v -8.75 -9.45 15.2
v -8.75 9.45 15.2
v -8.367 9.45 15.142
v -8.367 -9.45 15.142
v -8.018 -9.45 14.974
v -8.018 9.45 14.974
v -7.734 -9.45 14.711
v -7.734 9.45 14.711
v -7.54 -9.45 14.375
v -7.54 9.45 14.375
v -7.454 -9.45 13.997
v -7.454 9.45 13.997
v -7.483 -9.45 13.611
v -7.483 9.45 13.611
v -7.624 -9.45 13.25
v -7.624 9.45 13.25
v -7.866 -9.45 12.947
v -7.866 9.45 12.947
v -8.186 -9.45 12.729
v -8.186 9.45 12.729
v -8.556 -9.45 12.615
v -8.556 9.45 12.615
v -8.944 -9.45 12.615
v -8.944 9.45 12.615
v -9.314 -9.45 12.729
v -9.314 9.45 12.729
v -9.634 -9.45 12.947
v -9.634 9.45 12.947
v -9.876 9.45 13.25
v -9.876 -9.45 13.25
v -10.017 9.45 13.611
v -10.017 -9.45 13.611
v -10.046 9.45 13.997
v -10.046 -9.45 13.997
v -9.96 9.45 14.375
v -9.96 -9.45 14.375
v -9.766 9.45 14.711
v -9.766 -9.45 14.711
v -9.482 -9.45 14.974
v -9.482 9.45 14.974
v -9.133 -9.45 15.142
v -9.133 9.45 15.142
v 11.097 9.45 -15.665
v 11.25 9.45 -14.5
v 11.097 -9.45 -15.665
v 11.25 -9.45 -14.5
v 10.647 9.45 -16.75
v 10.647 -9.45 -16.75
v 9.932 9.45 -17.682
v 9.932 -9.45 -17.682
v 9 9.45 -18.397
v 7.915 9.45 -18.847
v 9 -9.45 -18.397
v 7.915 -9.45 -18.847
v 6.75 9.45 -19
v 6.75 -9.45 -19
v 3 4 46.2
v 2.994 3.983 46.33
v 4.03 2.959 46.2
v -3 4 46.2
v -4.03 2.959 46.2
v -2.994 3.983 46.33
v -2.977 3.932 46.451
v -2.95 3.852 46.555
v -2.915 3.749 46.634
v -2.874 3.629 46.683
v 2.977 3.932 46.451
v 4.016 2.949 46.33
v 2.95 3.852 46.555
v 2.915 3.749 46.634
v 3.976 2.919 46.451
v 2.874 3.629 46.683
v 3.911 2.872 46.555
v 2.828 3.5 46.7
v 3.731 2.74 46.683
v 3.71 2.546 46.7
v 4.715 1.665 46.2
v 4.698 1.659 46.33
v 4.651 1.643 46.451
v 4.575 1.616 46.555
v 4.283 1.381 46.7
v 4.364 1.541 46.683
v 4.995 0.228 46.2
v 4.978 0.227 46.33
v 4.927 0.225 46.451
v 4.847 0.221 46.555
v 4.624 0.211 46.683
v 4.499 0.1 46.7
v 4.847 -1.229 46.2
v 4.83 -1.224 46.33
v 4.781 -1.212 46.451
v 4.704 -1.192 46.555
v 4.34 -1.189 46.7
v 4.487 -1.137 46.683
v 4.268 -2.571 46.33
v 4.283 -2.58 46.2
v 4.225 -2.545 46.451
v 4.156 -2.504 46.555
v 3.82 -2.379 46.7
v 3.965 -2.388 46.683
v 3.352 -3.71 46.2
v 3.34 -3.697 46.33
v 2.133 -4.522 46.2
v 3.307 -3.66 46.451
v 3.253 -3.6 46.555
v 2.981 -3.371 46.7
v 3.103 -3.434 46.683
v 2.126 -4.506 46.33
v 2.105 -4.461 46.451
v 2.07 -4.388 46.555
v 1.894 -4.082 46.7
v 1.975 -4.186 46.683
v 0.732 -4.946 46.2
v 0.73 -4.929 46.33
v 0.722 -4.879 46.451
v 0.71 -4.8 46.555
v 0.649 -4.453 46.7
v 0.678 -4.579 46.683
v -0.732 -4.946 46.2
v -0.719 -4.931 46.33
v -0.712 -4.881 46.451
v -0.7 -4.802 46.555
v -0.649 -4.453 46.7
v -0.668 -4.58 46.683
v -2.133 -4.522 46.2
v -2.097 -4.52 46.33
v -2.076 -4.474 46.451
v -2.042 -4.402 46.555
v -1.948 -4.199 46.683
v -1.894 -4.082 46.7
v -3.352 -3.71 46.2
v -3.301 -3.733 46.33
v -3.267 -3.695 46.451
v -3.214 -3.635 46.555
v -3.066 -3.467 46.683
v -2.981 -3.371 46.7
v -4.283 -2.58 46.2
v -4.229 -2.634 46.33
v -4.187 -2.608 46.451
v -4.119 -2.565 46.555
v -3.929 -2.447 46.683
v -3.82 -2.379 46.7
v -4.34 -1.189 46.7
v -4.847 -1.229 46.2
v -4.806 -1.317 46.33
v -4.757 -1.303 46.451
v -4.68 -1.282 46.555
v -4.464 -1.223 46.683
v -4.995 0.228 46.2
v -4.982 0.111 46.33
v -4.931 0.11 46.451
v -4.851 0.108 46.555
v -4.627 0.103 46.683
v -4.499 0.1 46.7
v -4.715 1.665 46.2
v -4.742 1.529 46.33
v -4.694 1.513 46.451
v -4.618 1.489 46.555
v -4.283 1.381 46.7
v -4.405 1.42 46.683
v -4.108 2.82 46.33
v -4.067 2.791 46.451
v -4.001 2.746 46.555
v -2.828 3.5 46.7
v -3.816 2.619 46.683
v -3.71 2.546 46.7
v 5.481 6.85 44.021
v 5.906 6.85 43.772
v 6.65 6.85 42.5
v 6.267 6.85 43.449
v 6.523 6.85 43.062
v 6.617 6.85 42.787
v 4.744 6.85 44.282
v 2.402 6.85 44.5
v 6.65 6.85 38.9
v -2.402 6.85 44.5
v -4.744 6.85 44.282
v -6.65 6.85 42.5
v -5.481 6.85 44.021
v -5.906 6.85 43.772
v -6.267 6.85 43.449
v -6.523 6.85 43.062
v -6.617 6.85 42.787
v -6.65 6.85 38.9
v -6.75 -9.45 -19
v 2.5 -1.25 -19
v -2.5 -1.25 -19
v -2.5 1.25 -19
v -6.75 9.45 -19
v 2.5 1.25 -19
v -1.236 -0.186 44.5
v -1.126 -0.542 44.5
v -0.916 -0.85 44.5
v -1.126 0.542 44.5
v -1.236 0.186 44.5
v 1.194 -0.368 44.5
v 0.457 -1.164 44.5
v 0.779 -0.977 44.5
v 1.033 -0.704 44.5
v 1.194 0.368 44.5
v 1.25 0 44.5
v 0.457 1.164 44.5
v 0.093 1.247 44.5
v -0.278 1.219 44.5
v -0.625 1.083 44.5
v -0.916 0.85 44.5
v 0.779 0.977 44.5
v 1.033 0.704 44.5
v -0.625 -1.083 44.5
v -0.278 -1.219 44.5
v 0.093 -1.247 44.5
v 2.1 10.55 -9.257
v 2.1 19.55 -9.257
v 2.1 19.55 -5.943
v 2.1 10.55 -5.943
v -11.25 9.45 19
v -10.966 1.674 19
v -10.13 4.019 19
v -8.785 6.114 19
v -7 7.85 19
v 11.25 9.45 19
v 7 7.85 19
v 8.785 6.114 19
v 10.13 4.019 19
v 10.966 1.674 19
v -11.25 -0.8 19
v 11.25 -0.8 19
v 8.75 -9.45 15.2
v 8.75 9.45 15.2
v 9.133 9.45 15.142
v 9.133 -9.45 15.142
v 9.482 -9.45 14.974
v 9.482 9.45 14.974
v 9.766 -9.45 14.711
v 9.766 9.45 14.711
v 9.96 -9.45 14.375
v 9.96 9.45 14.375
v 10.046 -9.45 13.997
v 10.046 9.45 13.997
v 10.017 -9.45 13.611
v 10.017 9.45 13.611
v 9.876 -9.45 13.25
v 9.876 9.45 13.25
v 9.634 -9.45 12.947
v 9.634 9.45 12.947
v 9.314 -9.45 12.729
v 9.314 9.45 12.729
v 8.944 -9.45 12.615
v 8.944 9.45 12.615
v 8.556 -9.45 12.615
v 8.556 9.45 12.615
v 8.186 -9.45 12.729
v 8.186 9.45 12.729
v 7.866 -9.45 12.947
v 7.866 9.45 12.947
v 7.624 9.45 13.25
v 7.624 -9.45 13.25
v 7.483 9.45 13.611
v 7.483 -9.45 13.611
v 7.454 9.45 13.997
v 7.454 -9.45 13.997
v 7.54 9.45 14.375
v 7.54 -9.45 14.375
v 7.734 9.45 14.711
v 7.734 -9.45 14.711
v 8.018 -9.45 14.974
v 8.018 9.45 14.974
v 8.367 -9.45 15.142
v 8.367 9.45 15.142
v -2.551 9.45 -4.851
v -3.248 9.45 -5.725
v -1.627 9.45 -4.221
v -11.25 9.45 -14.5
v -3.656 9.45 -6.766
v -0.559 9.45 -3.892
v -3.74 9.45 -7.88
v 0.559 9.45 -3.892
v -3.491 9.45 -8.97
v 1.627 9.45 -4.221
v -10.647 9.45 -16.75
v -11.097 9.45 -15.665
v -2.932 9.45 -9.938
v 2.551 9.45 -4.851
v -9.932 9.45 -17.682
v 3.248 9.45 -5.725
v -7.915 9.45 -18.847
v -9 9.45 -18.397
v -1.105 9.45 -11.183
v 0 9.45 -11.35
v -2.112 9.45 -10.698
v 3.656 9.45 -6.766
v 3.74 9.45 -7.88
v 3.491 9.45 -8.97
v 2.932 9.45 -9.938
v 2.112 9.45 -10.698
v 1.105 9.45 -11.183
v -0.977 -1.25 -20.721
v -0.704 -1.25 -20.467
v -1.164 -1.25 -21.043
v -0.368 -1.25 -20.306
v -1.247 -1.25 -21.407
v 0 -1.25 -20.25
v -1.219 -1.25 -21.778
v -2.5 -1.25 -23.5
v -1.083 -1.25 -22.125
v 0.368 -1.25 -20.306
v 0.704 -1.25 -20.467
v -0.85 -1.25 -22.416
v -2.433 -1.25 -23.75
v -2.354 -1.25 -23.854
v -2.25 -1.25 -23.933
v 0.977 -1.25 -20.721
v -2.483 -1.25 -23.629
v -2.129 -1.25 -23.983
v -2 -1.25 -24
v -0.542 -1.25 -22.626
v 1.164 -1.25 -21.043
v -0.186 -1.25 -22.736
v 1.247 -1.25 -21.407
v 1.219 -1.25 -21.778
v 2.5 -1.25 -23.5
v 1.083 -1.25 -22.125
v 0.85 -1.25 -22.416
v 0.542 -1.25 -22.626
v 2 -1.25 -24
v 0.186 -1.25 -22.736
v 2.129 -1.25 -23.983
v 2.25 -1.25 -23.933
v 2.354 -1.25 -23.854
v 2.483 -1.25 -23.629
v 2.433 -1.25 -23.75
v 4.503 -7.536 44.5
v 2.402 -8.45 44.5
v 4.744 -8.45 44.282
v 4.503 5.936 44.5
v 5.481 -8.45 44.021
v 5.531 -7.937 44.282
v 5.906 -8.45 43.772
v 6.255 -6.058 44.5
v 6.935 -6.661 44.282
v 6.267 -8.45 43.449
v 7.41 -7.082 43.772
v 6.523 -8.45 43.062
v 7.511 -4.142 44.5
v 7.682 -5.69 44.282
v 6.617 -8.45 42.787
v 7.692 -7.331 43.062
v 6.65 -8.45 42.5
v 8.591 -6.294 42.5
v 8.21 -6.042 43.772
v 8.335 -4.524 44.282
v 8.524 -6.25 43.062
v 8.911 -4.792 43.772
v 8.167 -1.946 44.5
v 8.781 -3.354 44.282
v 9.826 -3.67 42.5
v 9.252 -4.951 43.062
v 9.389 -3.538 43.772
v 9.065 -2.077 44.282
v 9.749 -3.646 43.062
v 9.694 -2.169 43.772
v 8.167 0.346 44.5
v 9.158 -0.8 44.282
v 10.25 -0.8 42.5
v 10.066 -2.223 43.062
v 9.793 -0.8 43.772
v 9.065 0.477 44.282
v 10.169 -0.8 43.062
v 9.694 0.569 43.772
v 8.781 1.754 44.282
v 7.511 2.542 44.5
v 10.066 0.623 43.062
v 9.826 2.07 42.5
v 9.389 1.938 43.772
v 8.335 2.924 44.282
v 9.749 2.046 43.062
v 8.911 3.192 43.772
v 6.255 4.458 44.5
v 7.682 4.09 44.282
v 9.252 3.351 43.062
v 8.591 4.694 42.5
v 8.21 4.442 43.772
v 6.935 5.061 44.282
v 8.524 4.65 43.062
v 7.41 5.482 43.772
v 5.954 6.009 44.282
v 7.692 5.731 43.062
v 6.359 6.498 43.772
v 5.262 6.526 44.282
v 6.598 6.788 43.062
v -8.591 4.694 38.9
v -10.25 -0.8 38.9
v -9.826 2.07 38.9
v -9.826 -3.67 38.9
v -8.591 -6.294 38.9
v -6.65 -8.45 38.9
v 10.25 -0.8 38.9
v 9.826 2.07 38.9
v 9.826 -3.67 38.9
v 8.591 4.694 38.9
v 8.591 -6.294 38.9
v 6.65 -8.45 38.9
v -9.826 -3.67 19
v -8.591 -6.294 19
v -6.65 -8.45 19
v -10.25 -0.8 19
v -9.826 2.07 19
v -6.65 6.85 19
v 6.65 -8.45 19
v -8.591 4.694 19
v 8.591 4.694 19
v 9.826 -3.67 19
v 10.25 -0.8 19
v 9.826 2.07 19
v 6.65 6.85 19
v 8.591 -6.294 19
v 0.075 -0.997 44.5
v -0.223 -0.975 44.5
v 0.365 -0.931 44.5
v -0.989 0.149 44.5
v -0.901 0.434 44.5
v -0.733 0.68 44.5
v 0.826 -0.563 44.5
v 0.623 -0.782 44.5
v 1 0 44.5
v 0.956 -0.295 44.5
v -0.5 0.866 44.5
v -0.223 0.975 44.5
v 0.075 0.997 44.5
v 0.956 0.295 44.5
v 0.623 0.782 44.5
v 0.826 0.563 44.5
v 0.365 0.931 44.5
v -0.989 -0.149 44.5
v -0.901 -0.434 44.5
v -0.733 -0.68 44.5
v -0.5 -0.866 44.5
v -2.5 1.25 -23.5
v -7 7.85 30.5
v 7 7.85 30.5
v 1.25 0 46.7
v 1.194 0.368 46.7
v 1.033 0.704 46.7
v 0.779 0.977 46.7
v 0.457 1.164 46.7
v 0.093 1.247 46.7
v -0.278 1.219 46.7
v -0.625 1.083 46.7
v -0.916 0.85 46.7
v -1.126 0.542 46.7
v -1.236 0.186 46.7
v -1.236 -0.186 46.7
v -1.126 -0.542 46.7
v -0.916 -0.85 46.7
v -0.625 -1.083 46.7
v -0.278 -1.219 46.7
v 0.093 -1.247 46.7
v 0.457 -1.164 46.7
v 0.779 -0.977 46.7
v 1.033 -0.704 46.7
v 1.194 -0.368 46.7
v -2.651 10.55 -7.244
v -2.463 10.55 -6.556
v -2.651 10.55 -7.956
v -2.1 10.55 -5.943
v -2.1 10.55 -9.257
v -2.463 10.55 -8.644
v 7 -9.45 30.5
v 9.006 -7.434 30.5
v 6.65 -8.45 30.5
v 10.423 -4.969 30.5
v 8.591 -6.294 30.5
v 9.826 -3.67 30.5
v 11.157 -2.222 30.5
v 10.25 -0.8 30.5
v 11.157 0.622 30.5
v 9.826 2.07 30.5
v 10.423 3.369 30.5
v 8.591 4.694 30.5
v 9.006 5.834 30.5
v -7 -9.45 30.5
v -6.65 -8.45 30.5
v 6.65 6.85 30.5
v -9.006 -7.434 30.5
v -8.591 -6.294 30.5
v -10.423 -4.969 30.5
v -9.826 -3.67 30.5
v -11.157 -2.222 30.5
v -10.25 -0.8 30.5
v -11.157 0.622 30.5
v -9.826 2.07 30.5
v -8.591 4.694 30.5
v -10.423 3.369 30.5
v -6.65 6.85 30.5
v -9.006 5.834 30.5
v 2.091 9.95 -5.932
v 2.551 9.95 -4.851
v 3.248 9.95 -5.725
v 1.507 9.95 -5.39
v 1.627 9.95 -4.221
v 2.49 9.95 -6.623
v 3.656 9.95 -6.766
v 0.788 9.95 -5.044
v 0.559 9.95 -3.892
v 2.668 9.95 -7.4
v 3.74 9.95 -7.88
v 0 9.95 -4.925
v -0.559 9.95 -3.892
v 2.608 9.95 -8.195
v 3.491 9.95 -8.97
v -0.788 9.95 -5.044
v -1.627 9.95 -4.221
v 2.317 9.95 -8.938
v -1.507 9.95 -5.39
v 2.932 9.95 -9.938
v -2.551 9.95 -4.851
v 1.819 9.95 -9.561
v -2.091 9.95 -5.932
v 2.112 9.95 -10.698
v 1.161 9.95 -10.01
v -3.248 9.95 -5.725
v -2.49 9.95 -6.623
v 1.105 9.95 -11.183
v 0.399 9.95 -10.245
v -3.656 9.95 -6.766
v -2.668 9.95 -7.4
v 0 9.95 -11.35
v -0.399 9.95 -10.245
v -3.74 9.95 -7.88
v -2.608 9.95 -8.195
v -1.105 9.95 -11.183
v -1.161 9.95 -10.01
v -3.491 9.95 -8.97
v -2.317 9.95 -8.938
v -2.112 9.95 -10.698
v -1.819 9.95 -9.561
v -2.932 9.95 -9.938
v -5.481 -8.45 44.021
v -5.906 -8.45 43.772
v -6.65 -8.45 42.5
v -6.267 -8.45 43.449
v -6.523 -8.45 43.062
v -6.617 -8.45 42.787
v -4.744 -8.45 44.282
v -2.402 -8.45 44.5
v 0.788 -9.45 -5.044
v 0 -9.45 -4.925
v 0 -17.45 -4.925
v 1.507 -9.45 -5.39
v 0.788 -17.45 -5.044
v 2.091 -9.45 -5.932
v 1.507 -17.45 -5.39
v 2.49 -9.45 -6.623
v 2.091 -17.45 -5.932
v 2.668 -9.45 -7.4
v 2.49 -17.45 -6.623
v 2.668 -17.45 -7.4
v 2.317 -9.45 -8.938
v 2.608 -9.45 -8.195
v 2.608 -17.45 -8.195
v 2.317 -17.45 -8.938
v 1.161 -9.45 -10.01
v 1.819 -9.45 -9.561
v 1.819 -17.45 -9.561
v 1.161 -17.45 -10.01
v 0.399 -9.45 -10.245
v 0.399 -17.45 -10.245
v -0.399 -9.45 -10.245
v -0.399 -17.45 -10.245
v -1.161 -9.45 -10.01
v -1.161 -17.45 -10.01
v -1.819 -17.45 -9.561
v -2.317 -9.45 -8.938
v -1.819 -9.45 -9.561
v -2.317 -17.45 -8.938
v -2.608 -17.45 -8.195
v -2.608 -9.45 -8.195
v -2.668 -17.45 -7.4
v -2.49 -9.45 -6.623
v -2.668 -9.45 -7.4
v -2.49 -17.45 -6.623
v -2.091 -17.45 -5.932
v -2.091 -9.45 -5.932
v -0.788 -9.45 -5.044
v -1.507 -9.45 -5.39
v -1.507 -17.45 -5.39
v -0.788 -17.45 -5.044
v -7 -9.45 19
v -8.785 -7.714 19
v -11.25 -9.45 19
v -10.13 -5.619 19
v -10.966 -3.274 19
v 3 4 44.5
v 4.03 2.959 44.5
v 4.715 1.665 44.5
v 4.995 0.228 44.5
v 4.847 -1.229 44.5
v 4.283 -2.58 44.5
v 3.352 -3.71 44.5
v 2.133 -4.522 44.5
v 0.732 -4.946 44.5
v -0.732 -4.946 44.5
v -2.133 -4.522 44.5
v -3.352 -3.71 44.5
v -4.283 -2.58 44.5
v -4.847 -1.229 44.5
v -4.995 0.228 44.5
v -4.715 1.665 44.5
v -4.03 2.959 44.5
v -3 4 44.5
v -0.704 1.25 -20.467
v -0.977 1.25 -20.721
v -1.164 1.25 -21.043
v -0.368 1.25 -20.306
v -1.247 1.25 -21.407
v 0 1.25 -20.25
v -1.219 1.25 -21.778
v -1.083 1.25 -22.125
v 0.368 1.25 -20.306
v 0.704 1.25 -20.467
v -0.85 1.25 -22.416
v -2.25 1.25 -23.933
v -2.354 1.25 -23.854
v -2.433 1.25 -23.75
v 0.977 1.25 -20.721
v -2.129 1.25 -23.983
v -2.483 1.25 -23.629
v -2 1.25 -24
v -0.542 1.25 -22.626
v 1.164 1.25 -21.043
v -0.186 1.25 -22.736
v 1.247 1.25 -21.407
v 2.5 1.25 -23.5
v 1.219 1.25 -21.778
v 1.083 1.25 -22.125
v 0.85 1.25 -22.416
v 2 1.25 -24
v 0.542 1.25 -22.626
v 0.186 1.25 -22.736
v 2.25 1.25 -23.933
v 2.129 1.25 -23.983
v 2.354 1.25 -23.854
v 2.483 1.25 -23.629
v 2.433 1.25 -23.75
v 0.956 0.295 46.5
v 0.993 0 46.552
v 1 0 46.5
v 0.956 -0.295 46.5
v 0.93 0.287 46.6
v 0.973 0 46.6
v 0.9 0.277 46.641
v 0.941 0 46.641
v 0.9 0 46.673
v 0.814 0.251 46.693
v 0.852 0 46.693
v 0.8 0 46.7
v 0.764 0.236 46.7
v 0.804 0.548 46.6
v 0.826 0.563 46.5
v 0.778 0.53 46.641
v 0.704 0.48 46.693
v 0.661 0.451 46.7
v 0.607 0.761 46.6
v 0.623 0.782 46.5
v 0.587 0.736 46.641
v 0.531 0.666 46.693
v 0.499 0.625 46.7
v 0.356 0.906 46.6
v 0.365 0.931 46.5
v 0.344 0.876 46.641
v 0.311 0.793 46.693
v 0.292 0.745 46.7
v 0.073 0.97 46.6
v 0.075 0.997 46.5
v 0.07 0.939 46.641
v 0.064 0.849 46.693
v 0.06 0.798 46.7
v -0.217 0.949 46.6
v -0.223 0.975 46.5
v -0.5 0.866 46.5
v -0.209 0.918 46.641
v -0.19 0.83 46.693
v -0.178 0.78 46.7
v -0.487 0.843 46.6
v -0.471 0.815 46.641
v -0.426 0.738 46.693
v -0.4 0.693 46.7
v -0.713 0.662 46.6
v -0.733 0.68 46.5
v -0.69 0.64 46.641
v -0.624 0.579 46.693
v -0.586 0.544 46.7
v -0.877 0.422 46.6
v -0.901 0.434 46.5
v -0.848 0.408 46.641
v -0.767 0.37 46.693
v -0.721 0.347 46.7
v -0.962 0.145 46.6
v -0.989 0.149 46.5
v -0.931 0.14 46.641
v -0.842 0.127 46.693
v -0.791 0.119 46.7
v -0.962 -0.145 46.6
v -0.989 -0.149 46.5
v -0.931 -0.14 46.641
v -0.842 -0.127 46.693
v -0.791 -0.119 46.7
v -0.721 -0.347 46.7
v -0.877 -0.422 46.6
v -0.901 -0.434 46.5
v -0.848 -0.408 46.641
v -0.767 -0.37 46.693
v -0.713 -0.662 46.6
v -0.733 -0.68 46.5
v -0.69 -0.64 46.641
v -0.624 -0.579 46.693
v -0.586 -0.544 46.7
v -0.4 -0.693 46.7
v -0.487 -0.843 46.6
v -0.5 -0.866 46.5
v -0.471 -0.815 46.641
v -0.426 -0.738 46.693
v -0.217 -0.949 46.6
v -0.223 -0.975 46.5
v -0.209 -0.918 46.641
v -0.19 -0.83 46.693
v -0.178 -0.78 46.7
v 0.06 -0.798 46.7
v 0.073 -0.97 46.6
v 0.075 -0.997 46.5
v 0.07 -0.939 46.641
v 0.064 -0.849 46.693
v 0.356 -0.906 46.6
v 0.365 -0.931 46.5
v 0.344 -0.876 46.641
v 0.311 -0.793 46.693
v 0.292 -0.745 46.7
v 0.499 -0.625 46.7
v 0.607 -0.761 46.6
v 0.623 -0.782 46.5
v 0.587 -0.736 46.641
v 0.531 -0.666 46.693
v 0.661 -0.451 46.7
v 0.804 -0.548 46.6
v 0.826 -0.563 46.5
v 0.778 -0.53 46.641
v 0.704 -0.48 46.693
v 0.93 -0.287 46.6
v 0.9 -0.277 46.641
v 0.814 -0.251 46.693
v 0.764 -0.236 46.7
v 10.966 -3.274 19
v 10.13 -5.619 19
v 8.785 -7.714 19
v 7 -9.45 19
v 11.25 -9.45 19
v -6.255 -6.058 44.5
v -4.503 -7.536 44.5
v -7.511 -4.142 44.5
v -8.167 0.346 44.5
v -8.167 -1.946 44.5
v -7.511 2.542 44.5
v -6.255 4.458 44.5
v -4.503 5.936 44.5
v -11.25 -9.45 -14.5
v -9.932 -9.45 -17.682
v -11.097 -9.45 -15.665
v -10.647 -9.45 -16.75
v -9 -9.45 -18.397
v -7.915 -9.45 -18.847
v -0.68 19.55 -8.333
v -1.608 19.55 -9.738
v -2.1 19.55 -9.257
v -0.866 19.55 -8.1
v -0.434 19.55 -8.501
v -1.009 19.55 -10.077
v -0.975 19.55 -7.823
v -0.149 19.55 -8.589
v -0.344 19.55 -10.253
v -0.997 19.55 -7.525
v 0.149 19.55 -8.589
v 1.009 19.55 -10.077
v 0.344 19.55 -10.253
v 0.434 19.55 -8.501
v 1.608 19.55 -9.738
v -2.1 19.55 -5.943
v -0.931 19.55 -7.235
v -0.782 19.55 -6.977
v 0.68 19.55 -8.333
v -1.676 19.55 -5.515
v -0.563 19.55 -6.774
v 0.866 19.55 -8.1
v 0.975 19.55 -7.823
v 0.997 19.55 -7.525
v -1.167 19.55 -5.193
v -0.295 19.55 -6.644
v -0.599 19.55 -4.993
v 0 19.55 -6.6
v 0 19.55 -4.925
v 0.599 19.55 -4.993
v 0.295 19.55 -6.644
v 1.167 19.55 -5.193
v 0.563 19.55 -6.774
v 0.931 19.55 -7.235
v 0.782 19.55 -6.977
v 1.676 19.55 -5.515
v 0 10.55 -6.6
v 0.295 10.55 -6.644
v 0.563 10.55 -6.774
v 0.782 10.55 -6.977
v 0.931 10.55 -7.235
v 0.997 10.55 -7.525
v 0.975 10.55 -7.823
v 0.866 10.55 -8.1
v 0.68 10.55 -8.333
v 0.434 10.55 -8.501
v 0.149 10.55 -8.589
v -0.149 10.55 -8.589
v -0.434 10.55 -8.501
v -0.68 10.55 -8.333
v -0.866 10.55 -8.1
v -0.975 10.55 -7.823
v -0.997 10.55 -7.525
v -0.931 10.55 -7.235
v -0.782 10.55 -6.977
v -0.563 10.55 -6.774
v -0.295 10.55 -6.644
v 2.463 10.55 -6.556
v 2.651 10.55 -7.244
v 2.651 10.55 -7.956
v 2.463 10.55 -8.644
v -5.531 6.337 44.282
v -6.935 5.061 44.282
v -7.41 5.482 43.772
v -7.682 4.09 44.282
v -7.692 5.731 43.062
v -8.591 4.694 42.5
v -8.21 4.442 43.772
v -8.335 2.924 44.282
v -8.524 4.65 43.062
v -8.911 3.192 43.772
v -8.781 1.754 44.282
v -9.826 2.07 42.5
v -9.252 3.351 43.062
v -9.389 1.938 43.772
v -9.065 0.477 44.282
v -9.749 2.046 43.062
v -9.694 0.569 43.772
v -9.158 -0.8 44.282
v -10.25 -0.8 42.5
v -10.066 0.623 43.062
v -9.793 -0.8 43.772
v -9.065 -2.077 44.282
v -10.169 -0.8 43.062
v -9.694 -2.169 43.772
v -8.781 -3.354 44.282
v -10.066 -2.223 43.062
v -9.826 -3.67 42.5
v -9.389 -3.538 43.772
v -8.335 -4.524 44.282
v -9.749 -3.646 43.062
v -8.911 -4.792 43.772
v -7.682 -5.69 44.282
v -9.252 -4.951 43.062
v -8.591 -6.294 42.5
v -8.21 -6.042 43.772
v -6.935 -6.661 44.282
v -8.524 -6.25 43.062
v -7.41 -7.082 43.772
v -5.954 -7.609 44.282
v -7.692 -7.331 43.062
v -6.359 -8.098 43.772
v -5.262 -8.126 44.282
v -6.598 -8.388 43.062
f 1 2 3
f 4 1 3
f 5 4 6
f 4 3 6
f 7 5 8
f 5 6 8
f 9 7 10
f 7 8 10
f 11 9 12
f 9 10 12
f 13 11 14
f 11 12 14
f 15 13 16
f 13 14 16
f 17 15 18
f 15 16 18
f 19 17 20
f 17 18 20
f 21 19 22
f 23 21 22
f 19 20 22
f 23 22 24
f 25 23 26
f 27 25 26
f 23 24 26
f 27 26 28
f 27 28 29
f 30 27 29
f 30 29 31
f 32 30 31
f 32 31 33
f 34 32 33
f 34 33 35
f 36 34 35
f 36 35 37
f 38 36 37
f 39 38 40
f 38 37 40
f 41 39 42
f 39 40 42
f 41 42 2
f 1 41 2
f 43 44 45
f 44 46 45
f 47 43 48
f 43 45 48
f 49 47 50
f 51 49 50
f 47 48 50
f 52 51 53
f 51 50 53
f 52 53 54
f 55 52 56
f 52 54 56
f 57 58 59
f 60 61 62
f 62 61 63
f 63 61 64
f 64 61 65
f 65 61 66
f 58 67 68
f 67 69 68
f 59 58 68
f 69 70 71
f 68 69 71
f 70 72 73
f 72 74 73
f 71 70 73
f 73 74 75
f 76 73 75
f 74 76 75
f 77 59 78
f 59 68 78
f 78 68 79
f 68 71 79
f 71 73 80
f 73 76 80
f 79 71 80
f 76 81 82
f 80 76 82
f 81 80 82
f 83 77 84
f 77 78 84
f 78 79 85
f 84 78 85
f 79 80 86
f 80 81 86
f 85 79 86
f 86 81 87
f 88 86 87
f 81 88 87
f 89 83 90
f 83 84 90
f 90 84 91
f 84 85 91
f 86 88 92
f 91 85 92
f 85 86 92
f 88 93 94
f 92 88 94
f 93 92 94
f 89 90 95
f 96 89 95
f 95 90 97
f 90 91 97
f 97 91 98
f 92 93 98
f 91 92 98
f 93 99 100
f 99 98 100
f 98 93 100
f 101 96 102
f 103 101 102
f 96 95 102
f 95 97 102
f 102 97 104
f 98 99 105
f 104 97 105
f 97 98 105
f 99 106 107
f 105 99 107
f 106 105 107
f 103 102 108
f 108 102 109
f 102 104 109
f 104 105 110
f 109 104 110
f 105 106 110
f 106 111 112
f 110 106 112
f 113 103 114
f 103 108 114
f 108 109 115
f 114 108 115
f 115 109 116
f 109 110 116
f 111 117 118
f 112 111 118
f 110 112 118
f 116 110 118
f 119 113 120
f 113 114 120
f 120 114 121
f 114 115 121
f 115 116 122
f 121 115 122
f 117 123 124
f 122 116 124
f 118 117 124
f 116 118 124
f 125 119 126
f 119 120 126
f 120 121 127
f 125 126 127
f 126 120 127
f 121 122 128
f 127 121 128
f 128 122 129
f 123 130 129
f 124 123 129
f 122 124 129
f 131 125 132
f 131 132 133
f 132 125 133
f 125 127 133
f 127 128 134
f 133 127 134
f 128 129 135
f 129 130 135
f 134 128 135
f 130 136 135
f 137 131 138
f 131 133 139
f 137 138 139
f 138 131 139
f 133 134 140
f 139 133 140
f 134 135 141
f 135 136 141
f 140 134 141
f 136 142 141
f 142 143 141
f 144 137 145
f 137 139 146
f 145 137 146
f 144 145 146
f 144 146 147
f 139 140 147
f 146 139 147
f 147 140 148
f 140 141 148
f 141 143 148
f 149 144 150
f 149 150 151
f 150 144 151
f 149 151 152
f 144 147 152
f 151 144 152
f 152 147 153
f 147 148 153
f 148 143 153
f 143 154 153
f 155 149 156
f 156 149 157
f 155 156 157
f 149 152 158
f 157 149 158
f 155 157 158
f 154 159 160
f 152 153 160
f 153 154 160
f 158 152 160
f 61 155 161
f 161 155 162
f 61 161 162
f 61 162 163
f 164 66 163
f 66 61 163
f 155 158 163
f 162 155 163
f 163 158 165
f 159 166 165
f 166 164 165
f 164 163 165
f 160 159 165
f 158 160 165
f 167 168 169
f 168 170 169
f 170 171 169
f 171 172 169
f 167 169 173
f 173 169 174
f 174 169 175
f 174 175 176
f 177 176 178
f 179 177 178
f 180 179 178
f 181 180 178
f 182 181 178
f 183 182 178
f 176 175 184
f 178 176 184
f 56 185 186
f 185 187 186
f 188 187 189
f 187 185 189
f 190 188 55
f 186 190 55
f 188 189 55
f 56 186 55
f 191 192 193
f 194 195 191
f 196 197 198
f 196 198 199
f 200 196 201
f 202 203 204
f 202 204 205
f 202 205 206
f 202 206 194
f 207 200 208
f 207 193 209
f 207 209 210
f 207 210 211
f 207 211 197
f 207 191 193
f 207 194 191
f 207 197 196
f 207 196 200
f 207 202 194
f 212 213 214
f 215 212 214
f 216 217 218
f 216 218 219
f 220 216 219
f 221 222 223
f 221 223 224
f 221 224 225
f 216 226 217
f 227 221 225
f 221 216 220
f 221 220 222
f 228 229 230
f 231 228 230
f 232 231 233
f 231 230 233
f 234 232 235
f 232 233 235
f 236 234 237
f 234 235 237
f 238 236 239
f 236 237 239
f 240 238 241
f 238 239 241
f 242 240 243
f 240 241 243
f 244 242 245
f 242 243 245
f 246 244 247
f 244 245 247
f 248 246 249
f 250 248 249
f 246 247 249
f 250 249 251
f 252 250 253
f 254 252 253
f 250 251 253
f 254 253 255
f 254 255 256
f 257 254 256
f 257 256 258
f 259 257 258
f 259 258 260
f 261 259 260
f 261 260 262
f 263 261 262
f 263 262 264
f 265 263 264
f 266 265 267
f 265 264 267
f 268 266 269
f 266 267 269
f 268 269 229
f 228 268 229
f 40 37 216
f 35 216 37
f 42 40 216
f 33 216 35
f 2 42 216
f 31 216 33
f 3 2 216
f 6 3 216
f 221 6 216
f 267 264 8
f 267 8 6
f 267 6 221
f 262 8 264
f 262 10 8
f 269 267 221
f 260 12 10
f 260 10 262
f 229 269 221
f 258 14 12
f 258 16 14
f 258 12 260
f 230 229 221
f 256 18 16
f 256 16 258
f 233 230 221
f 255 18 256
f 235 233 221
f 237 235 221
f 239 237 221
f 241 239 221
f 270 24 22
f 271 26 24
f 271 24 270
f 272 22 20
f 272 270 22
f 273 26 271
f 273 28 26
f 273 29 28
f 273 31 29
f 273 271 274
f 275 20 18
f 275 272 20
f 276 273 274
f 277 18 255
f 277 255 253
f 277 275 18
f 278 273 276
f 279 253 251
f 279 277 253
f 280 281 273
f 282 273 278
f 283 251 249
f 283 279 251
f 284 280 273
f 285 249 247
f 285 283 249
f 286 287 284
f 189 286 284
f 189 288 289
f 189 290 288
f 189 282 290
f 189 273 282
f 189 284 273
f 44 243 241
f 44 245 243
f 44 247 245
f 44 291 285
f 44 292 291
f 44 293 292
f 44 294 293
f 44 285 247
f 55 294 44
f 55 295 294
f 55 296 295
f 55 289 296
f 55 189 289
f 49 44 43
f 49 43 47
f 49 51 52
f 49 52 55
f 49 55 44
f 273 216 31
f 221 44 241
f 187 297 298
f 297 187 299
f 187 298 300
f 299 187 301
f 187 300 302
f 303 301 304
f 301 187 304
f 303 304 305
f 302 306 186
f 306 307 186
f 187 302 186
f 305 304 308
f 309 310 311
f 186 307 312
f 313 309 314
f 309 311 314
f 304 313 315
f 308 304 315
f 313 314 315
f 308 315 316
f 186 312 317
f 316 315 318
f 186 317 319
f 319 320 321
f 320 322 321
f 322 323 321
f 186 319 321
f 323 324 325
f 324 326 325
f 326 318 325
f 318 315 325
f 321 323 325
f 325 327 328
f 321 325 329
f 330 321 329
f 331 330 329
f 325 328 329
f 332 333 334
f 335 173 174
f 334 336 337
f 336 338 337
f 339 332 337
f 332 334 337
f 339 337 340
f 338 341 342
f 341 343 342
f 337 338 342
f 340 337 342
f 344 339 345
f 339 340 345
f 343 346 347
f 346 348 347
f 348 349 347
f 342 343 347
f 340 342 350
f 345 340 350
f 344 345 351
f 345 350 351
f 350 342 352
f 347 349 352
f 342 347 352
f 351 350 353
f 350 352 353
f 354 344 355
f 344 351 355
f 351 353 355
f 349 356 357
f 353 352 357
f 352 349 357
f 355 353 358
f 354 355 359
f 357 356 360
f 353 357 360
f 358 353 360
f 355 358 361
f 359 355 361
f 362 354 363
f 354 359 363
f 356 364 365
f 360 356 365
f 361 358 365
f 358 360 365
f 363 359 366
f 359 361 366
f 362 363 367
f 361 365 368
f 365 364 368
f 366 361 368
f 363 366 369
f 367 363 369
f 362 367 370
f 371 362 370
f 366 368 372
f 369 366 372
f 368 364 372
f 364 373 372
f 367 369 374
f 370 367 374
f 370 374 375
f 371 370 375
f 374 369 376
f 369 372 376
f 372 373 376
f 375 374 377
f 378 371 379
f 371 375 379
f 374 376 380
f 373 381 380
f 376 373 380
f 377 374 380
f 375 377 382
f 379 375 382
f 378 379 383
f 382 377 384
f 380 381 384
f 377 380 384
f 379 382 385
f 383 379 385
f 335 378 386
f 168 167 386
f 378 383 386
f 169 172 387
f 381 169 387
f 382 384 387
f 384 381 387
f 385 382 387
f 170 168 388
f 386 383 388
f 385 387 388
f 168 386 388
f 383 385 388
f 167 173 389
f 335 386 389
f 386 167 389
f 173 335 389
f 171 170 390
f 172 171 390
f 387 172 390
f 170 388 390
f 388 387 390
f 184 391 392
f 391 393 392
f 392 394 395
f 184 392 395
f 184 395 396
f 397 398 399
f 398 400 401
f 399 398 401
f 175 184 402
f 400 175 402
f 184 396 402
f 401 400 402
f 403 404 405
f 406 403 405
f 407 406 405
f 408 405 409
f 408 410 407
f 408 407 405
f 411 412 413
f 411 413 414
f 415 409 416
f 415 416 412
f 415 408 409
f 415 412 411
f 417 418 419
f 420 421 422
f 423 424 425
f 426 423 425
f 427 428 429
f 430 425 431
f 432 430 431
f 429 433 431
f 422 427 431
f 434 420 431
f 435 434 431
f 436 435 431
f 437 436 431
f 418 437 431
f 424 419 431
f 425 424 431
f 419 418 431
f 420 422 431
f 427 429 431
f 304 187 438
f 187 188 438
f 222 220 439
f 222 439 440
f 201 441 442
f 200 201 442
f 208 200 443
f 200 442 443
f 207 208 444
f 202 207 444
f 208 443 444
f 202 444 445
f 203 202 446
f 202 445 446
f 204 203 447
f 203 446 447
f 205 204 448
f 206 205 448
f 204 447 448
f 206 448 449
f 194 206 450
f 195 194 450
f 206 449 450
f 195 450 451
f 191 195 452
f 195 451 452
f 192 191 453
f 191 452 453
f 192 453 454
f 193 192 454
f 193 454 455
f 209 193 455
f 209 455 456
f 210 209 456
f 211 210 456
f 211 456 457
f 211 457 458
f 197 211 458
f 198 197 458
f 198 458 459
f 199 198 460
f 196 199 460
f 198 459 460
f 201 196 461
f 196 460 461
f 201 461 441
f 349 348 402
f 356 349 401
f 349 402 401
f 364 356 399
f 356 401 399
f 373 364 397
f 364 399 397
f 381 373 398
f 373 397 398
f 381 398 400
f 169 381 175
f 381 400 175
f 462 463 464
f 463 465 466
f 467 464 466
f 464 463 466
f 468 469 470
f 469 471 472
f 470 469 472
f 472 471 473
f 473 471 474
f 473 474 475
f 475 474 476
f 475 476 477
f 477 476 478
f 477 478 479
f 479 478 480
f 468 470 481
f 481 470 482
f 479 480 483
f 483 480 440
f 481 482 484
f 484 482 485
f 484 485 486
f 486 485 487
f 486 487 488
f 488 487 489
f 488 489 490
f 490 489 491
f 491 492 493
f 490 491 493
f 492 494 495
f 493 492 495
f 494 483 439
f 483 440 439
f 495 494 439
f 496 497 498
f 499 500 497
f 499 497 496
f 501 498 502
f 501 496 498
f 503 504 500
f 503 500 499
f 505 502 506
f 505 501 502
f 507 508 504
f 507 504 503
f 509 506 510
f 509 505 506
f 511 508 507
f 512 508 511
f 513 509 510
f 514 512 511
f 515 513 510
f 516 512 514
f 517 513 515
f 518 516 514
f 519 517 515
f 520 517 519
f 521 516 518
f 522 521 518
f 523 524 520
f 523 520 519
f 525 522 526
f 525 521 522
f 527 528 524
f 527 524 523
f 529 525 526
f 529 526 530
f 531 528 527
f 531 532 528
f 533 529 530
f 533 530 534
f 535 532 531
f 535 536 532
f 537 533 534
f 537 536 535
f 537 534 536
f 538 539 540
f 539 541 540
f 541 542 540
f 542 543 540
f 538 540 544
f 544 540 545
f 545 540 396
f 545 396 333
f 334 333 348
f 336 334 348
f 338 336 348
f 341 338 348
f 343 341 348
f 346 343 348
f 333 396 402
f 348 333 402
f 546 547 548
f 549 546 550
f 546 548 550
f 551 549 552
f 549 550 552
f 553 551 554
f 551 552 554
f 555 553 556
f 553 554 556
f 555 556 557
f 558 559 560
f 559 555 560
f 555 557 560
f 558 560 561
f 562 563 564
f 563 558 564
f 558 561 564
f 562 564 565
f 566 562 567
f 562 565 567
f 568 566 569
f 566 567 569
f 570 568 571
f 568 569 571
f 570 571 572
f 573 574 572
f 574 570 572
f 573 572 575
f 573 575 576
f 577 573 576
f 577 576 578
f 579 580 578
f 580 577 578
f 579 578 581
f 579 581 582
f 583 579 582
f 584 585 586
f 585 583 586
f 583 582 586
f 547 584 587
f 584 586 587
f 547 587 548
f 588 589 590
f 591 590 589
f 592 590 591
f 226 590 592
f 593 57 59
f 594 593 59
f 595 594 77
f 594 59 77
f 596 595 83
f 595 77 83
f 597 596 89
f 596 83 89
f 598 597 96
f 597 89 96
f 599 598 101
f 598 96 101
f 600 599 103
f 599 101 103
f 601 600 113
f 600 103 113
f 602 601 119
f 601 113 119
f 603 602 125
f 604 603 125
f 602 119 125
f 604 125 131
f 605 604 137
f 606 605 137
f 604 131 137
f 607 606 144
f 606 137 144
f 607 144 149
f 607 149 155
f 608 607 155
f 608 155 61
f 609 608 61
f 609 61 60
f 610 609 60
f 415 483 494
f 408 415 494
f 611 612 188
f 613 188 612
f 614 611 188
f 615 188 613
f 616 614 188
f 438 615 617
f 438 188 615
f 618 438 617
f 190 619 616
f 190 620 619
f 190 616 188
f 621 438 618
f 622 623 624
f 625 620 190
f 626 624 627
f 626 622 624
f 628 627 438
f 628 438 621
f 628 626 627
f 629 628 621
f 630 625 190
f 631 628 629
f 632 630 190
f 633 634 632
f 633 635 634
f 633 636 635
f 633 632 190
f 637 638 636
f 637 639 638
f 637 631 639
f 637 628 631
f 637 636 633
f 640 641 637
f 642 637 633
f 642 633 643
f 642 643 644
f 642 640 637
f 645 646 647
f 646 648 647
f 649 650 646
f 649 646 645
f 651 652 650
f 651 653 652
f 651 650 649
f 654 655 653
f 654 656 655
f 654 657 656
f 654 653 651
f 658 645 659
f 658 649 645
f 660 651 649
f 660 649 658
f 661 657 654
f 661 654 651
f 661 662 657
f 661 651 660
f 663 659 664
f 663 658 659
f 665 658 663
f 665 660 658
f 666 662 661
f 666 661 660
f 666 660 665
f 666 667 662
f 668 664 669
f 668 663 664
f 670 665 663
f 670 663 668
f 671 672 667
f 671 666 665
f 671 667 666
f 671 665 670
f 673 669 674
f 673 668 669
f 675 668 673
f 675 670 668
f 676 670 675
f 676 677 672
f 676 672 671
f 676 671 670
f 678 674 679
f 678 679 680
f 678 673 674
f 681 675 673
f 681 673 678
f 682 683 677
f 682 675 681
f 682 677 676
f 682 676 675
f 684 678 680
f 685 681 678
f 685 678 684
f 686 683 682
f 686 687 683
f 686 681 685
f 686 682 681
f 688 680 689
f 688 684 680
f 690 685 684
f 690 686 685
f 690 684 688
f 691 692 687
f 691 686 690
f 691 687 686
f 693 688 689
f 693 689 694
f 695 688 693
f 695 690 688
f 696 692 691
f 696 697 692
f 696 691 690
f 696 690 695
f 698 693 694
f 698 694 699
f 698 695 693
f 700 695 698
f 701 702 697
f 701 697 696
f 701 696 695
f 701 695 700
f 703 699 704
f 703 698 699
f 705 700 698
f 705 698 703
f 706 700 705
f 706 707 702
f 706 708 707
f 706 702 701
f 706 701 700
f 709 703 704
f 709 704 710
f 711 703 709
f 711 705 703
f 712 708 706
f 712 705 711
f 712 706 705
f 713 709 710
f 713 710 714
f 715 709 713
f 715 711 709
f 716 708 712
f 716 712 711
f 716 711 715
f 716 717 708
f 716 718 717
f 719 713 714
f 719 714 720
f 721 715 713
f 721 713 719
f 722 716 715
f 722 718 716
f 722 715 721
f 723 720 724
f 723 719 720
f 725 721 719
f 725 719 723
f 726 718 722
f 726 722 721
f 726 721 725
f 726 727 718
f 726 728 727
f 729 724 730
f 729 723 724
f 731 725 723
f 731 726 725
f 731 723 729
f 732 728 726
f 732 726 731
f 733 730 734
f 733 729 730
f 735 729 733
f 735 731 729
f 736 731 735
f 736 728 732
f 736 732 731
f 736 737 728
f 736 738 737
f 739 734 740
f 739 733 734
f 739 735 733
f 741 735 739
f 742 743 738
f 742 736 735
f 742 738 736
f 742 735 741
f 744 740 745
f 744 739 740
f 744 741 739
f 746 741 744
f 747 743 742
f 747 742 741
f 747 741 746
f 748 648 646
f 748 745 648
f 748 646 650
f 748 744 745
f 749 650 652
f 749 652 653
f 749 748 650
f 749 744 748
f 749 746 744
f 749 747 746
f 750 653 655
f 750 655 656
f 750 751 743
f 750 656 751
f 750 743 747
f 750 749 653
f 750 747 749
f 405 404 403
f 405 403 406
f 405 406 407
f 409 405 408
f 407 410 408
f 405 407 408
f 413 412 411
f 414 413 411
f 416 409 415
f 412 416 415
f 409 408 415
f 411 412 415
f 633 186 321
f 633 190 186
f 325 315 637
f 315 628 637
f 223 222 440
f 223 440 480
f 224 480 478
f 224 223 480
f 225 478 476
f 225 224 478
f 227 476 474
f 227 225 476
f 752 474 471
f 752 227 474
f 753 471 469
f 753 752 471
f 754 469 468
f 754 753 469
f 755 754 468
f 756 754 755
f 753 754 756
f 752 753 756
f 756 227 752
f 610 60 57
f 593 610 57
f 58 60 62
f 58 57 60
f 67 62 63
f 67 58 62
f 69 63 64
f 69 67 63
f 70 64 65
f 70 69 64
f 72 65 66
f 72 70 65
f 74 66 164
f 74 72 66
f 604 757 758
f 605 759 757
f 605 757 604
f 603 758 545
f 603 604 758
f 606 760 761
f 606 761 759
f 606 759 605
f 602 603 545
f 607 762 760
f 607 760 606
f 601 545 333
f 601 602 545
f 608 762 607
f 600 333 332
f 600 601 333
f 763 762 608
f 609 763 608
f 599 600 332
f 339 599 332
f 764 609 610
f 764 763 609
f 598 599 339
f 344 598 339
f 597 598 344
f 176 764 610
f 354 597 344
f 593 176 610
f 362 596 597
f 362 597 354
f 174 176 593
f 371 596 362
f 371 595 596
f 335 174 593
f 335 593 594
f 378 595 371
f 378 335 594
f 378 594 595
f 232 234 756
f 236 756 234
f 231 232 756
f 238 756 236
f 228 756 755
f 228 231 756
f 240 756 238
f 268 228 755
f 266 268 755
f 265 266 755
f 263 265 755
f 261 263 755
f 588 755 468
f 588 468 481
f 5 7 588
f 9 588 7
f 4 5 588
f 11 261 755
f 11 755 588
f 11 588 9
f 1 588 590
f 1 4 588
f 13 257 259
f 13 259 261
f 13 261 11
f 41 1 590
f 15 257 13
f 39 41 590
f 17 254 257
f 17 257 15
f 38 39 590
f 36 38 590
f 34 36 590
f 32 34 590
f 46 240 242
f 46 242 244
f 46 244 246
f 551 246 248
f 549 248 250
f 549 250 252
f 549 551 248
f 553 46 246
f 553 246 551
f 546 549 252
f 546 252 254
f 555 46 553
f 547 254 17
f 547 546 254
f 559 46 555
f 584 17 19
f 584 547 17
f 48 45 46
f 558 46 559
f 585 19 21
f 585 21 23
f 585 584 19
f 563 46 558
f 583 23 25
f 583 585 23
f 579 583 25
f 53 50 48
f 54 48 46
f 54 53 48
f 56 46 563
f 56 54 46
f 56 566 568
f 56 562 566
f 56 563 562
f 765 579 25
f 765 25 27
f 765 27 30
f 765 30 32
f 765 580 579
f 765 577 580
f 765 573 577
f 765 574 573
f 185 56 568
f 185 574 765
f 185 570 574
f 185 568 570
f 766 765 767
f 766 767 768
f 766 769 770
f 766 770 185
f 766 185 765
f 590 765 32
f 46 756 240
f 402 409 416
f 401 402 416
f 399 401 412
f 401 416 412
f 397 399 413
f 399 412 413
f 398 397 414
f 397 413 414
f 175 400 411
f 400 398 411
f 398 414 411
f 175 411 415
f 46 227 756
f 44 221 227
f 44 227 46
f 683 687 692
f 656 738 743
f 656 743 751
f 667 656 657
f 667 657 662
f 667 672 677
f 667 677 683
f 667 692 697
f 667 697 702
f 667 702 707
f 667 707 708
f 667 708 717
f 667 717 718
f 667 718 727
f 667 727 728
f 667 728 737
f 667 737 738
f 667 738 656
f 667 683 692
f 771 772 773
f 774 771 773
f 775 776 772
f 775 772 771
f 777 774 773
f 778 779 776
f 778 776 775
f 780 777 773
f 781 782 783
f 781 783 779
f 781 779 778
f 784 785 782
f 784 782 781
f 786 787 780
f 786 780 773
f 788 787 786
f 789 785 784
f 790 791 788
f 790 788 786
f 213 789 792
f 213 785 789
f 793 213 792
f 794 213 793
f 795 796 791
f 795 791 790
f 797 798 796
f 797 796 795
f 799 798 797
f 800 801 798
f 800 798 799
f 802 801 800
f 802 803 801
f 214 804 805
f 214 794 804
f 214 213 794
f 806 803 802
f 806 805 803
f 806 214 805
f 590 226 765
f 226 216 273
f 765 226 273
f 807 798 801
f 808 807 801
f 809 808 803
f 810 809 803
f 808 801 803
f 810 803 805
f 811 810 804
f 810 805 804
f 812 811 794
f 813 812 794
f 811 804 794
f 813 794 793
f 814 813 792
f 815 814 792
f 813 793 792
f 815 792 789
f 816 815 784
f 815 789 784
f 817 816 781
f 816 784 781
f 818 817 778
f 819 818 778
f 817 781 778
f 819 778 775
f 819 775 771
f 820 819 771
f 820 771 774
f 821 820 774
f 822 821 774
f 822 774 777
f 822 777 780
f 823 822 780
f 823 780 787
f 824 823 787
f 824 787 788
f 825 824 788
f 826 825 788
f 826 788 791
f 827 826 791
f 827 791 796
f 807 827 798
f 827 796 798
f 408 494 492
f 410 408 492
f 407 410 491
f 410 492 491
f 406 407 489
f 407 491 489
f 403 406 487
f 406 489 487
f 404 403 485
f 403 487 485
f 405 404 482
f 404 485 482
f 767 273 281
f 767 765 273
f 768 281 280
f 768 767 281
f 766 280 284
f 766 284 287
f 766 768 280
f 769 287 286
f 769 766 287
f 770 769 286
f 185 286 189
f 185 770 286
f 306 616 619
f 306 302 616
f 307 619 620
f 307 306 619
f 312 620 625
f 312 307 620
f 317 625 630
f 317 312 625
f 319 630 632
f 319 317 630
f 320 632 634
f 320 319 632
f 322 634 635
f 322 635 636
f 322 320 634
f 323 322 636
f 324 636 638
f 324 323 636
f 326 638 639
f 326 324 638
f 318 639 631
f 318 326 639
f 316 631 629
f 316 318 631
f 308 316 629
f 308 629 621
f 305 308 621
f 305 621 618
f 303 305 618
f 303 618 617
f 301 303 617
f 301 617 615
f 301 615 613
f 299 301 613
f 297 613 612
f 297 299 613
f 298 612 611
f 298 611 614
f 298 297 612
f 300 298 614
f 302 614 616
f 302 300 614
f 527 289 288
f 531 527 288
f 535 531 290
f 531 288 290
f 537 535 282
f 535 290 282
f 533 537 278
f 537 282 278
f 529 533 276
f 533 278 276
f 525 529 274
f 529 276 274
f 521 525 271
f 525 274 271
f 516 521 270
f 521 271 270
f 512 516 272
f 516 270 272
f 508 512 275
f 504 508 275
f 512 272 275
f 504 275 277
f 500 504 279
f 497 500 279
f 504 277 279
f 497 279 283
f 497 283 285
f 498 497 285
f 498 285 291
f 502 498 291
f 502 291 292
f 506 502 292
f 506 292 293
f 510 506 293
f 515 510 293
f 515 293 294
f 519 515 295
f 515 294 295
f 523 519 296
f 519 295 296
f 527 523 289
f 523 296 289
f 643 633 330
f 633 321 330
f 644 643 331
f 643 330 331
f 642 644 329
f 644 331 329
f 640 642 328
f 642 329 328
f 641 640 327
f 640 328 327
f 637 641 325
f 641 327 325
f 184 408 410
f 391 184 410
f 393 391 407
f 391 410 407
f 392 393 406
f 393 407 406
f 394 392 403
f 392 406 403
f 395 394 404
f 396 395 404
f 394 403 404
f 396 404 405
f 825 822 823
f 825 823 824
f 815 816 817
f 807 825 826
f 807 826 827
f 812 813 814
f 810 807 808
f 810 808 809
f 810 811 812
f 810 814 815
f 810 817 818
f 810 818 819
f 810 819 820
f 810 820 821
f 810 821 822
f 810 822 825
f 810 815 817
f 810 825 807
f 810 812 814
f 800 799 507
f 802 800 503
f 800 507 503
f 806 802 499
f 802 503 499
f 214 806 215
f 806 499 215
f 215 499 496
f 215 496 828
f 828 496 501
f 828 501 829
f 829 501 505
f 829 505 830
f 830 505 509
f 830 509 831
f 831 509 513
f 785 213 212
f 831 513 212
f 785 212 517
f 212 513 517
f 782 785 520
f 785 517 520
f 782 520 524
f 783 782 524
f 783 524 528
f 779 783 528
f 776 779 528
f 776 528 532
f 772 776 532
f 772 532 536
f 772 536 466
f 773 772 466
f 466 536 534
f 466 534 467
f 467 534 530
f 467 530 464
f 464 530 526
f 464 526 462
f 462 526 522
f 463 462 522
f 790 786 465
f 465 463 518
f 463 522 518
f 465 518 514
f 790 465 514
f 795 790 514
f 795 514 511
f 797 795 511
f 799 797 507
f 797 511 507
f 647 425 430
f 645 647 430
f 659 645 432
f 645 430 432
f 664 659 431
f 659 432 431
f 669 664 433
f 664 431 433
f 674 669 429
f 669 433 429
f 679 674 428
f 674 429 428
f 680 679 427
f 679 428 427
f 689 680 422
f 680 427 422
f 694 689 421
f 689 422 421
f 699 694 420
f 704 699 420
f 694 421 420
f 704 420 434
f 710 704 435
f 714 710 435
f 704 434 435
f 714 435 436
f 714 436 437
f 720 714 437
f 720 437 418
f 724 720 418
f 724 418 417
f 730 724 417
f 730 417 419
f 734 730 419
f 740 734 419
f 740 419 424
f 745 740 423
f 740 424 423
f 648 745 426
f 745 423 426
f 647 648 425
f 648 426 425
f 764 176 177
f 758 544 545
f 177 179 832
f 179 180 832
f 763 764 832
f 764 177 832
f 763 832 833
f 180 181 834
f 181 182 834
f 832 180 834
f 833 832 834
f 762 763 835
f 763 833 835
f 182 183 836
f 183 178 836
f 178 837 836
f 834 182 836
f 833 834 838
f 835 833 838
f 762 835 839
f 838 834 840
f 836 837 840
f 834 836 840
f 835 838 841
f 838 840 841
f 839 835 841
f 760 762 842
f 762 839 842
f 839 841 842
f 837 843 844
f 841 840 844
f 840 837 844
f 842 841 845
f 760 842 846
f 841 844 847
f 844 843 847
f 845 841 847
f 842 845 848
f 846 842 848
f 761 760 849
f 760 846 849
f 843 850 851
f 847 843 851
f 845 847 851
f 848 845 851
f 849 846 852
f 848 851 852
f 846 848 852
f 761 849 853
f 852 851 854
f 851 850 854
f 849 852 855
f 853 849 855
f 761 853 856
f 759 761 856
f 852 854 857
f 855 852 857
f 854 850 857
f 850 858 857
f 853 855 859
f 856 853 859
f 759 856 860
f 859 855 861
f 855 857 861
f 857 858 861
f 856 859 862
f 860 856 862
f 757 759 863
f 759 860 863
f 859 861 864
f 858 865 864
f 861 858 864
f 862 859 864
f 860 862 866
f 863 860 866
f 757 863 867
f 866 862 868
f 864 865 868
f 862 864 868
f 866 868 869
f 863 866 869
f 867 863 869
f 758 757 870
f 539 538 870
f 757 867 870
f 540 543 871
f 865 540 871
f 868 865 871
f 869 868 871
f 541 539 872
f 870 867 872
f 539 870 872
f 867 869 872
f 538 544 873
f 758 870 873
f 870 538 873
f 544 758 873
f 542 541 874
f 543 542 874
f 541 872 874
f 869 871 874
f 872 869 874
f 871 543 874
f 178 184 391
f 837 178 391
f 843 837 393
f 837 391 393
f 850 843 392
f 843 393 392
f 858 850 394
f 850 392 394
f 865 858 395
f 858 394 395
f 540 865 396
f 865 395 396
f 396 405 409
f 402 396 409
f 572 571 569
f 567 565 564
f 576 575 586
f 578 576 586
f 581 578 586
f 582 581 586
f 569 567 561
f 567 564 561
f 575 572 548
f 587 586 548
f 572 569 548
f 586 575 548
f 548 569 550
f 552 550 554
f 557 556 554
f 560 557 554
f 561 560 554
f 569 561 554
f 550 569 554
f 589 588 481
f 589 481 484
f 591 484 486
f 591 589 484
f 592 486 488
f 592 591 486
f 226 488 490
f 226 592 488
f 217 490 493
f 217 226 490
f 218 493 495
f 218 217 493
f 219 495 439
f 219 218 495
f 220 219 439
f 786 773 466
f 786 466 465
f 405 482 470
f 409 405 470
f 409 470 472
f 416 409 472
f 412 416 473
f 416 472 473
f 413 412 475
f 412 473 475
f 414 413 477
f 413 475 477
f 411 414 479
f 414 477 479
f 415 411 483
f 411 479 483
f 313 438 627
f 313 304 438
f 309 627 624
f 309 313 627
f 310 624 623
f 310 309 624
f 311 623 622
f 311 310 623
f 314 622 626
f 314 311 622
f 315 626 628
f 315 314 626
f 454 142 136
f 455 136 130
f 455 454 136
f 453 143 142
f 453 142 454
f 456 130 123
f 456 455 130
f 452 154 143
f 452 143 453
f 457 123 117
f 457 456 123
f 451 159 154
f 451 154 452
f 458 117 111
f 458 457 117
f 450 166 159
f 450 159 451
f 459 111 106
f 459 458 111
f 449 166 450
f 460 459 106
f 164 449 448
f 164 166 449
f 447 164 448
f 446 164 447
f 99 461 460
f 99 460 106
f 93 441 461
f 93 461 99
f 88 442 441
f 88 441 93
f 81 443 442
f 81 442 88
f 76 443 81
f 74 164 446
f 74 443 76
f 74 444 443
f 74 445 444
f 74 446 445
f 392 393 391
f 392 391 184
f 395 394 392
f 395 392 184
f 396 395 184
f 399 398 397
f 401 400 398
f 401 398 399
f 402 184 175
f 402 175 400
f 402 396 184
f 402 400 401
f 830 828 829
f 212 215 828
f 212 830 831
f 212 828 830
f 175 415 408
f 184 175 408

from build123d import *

# Parameters (mm, degrees)
SKETCH1_W                = 22.5
SKETCH1_H                = 38
BOSS_EXTRUDE1_DEPTH      = 9.45
FILLET1_R                = 4.5
BOSS_EXTRUDE2_DEPTH      = 11.5
CUT_EXTRUDE1_DEPTH       = 11.5
SKETCH4_W                = 5
SKETCH4_H                = 5
SKETCH4_R                = 1.25
BOSS_EXTRUDE3_DEPTH      = 1.25
SKETCH5_R                = 3.75
BOSS_EXTRUDE4_DEPTH      = 0.5
BOSS_EXTRUDE5_DEPTH      = 9.6
BOSS_EXTRUDE5_DEPTH_BACK = 27.4
SKETCH6_R                = 2.675
CUT_EXTRUDE4_DEPTH       = 9
SKETCH8_R                = 1
CUT_EXTRUDE5_DEPTH       = 9
FILLET2_R                = 0.5
BOSS_EXTRUDE6_DEPTH      = 27.7
SPLIT1_SURFACE_1_BACK    = 83.908
SPLIT1_SURFACE_1_DEPTH   = 167.816
SPLIT1_SURFACE_2_BACK    = 83.908
SPLIT1_SURFACE_2_DEPTH   = 167.816
CUT_EXTRUDE6_DEPTH       = 2.2
FILLET4_R                = 0.5
FILLET3_R                = 2
SKETCH12_R               = 1.25
CUT_EXTRUDE7_DEPTH       = 2.2
SKETCH13_R               = 1
BOSS_EXTRUDE7_DEPTH      = 2.2
FILLET5_R                = 0.2
SKETCH14_R               = 1.3
CUT_EXTRUDE8_DEPTH       = 18.9


with BuildPart() as part:
    # Sketch1 → Boss-Extrude1 (new, symmetric)
    with BuildSketch(Plane(origin=(0, 0, 0), x_dir=(1, 0, 0), z_dir=(0, 1, 0))):
        Rectangle(SKETCH1_W, SKETCH1_H)
    extrude(amount=BOSS_EXTRUDE1_DEPTH, both=True)

    # Fillet1
    fillet1_edges = [part.edges().sort_by_distance(p)[0] for p in [
        (-11.25, 0, -19),
        (11.25, 0, -19),
    ]]
    fillet(fillet1_edges, radius=FILLET1_R)

    # Sketch2 → Boss-Extrude2 (add)
    with BuildSketch(Plane.XY.offset(19)):
        with BuildLine():
            Line((7, -9.45), (-7, -9.45))
            ThreePointArc((-7, -9.45), (-11.25, -0.8), (-7, 7.85))
            Line((-7, 7.85), (7, 7.85))
            ThreePointArc((7, 7.85), (11.25, -0.8), (7, -9.45))
        make_face()
    extrude(amount=BOSS_EXTRUDE2_DEPTH)

    # Sketch3 → Cut-Extrude1 (cut)
    with BuildSketch(Plane.XY.offset(30.5)):
        with BuildLine():
            Line((-6.649728078, -8.45), (6.649728078, -8.45))
            ThreePointArc((6.649728078, -8.45), (10.25, -0.8), (6.649728078, 6.85))
            Line((6.649728078, 6.85), (-6.649728078, 6.85))
            ThreePointArc((-6.649728078, 6.85), (-10.25, -0.8), (-6.649728078, -8.45))
        make_face()
    extrude(amount=-CUT_EXTRUDE1_DEPTH, mode=Mode.SUBTRACT)

    # Sketch4 → Boss-Extrude3 (add, symmetric)
    with BuildSketch(Plane(origin=(0, 0, 0), x_dir=(1, 0, 0), z_dir=(0, 1, 0))):
        with Locations((0, 21.5)):
            Rectangle(SKETCH4_W, SKETCH4_H)
        with Locations(Location((0, 21.5, 0), (0, 0, 270))):
            Circle(SKETCH4_R, mode=Mode.SUBTRACT)
    extrude(amount=BOSS_EXTRUDE3_DEPTH, both=True)

    # Sketch5 → Boss-Extrude4 (add)
    with BuildSketch(Plane(origin=(0, 9.45, 0), x_dir=(1, 0, 0), z_dir=(0, 1, 0))):
        with Locations(Location((0, 7.6, 0), (0, 0, 90))):
            Circle(SKETCH5_R)
    extrude(amount=BOSS_EXTRUDE4_DEPTH)

    # Sketch6 → Boss-Extrude5 (add, two sides: drawn at the far end of the back side and taken through both)
    with BuildSketch(Plane(origin=(0, 9.95, 0), x_dir=(1, 0, 0), z_dir=(0, 1, 0)).offset(-BOSS_EXTRUDE5_DEPTH_BACK)):
        with Locations(Location((0, 7.6, 0), (0, 0, 270))):
            Circle(SKETCH6_R)
    extrude(amount=BOSS_EXTRUDE5_DEPTH + BOSS_EXTRUDE5_DEPTH_BACK)

    # Sketch7 → Cut-Extrude4 (cut)
    with BuildSketch(Plane(origin=(0, 19.55, 0), x_dir=(1, 0, 0), z_dir=(0, 1, 0))):
        with BuildLine():
            Line((-2.1, 9.256992758), (-2.1, 5.943007242))
            ThreePointArc((-2.1, 5.943007242), (-2.675, 7.6), (-2.1, 9.256992758))
        make_face()
        with BuildLine():
            Line((2.1, 9.256992758), (2.1, 5.943007242))
            ThreePointArc((2.1, 5.943007242), (2.675, 7.6), (2.1, 9.256992758))
        make_face()
    extrude(amount=-CUT_EXTRUDE4_DEPTH, mode=Mode.SUBTRACT)

    # Sketch8 → Cut-Extrude5 (cut)
    with BuildSketch(Plane(origin=(0, 19.55, 0), x_dir=(1, 0, 0), z_dir=(0, 1, 0))):
        with Locations(Location((0, 7.6, 0), (0, 0, 270))):
            Circle(SKETCH8_R)
    extrude(amount=-CUT_EXTRUDE5_DEPTH, mode=Mode.SUBTRACT)

    # Fillet2
    fillet2_edges = [part.edges().sort_by_distance(p)[0] for p in [
        (-2.5, 0, -24),
        (2.5, 0, -24),
    ]]
    fillet(fillet2_edges, radius=FILLET2_R)

    # Sketch14 → Cut-Extrude8 (cut)
    with BuildSketch(Plane(origin=(0, 9.45, 0), x_dir=(1, 0, 0), z_dir=(0, 1, 0))):
        with Locations(Location((-8.75, -13.9, 0), (0, 0, 270))):
            Circle(SKETCH14_R)
        with Locations(Location((8.75, -13.9, 0), (0, 0, 270))):
            Circle(SKETCH14_R)
    extrude(amount=-CUT_EXTRUDE8_DEPTH, mode=Mode.SUBTRACT)


with BuildPart() as body_2:
    # Sketch9 → Boss-Extrude6 (new body)
    with BuildSketch(Plane.XY.offset(19)):
        with BuildLine():
            Line((-6.649728078, -8.45), (6.649728078, -8.45))
            ThreePointArc((6.649728078, -8.45), (10.25, -0.8), (6.649728078, 6.85))
            Line((6.649728078, 6.85), (-6.649728078, 6.85))
            ThreePointArc((-6.649728078, 6.85), (-10.25, -0.8), (-6.649728078, -8.45))
        make_face()
    extrude(amount=BOSS_EXTRUDE6_DEPTH)


with BuildPart() as body_3:
    # Split1: the piece behind the surface
    add(body_2.part)
    # Split1 surface: a surface, the sketch's curves swept straight by 167.816 mm
    with BuildLine(Plane(origin=(0, 6.85, 0), x_dir=(1, 0, 0), z_dir=(0, 1, 0)).offset(-SPLIT1_SURFACE_1_BACK), mode=Mode.PRIVATE) as split1_surface_1_path:
        Line((-10.25, -38.9), (10.25, -38.9))
    split1_surface_1 = Shell.extrude(split1_surface_1_path.wire(), (0 * SPLIT1_SURFACE_1_DEPTH, 1 * SPLIT1_SURFACE_1_DEPTH, 0 * SPLIT1_SURFACE_1_DEPTH))
    split(bisect_by=split1_surface_1, keep=Keep.BOTTOM)

    # Sketch11 → Cut-Extrude6 (cut)
    with BuildSketch(Plane.XY.offset(46.7)):
        with BuildLine():
            Line((-6.649728078, -8.45), (6.649728078, -8.45))
            ThreePointArc((6.649728078, -8.45), (10.25, -0.8), (6.649728078, 6.85))
            Line((6.649728078, 6.85), (-6.649728078, 6.85))
            ThreePointArc((-6.649728078, 6.85), (-10.25, -0.8), (-6.649728078, -8.45))
        make_face()
        with BuildLine():
            Line((-3, 4), (3, 4))
            ThreePointArc((3, 4), (0, -5), (-3, 4))
        make_face(mode=Mode.SUBTRACT)
    extrude(amount=-CUT_EXTRUDE6_DEPTH, mode=Mode.SUBTRACT)

    # Fillet4
    fillet4_edges = [body_3.edges().sort_by_distance(p)[0] for p in [
        (0, -5, 46.7),
        (0, 4, 46.7),
    ]]
    fillet(fillet4_edges, radius=FILLET4_R)

    # Fillet3
    fillet3_edges = [body_3.edges().sort_by_distance(p)[0] for p in [
        (-10.25, -0.8, 44.5),
        (10.25, -0.8, 44.5),
    ]]
    fillet(fillet3_edges, radius=FILLET3_R)

    # Sketch12 → Cut-Extrude7 (cut)
    with BuildSketch(Plane.XY.offset(46.7)):
        Circle(SKETCH12_R)
    extrude(amount=-CUT_EXTRUDE7_DEPTH, mode=Mode.SUBTRACT)


with BuildPart() as body_2_1:
    add(body_2.part)

    # Split1: split by a surface, the side it looks to stays
    # Split1 surface: a surface, the sketch's curves swept straight by 167.816 mm
    with BuildLine(Plane(origin=(0, 6.85, 0), x_dir=(1, 0, 0), z_dir=(0, 1, 0)).offset(-SPLIT1_SURFACE_2_BACK), mode=Mode.PRIVATE) as split1_surface_2_path:
        Line((-10.25, -38.9), (10.25, -38.9))
    split1_surface_2 = Shell.extrude(split1_surface_2_path.wire(), (0 * SPLIT1_SURFACE_2_DEPTH, 1 * SPLIT1_SURFACE_2_DEPTH, 0 * SPLIT1_SURFACE_2_DEPTH))
    split(bisect_by=split1_surface_2, keep=Keep.TOP)


with BuildPart() as body_4:
    # Sketch13 → Boss-Extrude7 (new body)
    with BuildSketch(Plane.XY.offset(44.5)):
        Circle(SKETCH13_R)
    extrude(amount=BOSS_EXTRUDE7_DEPTH)

    # Fillet5
    fillet5_edges = [body_4.edges().sort_by_distance(p)[0] for p in [
        (-1, 0, 46.7),
    ]]
    fillet(fillet5_edges, radius=FILLET5_R)


solid = Compound([part.part, body_3.part, body_2_1.part, body_4.part])
